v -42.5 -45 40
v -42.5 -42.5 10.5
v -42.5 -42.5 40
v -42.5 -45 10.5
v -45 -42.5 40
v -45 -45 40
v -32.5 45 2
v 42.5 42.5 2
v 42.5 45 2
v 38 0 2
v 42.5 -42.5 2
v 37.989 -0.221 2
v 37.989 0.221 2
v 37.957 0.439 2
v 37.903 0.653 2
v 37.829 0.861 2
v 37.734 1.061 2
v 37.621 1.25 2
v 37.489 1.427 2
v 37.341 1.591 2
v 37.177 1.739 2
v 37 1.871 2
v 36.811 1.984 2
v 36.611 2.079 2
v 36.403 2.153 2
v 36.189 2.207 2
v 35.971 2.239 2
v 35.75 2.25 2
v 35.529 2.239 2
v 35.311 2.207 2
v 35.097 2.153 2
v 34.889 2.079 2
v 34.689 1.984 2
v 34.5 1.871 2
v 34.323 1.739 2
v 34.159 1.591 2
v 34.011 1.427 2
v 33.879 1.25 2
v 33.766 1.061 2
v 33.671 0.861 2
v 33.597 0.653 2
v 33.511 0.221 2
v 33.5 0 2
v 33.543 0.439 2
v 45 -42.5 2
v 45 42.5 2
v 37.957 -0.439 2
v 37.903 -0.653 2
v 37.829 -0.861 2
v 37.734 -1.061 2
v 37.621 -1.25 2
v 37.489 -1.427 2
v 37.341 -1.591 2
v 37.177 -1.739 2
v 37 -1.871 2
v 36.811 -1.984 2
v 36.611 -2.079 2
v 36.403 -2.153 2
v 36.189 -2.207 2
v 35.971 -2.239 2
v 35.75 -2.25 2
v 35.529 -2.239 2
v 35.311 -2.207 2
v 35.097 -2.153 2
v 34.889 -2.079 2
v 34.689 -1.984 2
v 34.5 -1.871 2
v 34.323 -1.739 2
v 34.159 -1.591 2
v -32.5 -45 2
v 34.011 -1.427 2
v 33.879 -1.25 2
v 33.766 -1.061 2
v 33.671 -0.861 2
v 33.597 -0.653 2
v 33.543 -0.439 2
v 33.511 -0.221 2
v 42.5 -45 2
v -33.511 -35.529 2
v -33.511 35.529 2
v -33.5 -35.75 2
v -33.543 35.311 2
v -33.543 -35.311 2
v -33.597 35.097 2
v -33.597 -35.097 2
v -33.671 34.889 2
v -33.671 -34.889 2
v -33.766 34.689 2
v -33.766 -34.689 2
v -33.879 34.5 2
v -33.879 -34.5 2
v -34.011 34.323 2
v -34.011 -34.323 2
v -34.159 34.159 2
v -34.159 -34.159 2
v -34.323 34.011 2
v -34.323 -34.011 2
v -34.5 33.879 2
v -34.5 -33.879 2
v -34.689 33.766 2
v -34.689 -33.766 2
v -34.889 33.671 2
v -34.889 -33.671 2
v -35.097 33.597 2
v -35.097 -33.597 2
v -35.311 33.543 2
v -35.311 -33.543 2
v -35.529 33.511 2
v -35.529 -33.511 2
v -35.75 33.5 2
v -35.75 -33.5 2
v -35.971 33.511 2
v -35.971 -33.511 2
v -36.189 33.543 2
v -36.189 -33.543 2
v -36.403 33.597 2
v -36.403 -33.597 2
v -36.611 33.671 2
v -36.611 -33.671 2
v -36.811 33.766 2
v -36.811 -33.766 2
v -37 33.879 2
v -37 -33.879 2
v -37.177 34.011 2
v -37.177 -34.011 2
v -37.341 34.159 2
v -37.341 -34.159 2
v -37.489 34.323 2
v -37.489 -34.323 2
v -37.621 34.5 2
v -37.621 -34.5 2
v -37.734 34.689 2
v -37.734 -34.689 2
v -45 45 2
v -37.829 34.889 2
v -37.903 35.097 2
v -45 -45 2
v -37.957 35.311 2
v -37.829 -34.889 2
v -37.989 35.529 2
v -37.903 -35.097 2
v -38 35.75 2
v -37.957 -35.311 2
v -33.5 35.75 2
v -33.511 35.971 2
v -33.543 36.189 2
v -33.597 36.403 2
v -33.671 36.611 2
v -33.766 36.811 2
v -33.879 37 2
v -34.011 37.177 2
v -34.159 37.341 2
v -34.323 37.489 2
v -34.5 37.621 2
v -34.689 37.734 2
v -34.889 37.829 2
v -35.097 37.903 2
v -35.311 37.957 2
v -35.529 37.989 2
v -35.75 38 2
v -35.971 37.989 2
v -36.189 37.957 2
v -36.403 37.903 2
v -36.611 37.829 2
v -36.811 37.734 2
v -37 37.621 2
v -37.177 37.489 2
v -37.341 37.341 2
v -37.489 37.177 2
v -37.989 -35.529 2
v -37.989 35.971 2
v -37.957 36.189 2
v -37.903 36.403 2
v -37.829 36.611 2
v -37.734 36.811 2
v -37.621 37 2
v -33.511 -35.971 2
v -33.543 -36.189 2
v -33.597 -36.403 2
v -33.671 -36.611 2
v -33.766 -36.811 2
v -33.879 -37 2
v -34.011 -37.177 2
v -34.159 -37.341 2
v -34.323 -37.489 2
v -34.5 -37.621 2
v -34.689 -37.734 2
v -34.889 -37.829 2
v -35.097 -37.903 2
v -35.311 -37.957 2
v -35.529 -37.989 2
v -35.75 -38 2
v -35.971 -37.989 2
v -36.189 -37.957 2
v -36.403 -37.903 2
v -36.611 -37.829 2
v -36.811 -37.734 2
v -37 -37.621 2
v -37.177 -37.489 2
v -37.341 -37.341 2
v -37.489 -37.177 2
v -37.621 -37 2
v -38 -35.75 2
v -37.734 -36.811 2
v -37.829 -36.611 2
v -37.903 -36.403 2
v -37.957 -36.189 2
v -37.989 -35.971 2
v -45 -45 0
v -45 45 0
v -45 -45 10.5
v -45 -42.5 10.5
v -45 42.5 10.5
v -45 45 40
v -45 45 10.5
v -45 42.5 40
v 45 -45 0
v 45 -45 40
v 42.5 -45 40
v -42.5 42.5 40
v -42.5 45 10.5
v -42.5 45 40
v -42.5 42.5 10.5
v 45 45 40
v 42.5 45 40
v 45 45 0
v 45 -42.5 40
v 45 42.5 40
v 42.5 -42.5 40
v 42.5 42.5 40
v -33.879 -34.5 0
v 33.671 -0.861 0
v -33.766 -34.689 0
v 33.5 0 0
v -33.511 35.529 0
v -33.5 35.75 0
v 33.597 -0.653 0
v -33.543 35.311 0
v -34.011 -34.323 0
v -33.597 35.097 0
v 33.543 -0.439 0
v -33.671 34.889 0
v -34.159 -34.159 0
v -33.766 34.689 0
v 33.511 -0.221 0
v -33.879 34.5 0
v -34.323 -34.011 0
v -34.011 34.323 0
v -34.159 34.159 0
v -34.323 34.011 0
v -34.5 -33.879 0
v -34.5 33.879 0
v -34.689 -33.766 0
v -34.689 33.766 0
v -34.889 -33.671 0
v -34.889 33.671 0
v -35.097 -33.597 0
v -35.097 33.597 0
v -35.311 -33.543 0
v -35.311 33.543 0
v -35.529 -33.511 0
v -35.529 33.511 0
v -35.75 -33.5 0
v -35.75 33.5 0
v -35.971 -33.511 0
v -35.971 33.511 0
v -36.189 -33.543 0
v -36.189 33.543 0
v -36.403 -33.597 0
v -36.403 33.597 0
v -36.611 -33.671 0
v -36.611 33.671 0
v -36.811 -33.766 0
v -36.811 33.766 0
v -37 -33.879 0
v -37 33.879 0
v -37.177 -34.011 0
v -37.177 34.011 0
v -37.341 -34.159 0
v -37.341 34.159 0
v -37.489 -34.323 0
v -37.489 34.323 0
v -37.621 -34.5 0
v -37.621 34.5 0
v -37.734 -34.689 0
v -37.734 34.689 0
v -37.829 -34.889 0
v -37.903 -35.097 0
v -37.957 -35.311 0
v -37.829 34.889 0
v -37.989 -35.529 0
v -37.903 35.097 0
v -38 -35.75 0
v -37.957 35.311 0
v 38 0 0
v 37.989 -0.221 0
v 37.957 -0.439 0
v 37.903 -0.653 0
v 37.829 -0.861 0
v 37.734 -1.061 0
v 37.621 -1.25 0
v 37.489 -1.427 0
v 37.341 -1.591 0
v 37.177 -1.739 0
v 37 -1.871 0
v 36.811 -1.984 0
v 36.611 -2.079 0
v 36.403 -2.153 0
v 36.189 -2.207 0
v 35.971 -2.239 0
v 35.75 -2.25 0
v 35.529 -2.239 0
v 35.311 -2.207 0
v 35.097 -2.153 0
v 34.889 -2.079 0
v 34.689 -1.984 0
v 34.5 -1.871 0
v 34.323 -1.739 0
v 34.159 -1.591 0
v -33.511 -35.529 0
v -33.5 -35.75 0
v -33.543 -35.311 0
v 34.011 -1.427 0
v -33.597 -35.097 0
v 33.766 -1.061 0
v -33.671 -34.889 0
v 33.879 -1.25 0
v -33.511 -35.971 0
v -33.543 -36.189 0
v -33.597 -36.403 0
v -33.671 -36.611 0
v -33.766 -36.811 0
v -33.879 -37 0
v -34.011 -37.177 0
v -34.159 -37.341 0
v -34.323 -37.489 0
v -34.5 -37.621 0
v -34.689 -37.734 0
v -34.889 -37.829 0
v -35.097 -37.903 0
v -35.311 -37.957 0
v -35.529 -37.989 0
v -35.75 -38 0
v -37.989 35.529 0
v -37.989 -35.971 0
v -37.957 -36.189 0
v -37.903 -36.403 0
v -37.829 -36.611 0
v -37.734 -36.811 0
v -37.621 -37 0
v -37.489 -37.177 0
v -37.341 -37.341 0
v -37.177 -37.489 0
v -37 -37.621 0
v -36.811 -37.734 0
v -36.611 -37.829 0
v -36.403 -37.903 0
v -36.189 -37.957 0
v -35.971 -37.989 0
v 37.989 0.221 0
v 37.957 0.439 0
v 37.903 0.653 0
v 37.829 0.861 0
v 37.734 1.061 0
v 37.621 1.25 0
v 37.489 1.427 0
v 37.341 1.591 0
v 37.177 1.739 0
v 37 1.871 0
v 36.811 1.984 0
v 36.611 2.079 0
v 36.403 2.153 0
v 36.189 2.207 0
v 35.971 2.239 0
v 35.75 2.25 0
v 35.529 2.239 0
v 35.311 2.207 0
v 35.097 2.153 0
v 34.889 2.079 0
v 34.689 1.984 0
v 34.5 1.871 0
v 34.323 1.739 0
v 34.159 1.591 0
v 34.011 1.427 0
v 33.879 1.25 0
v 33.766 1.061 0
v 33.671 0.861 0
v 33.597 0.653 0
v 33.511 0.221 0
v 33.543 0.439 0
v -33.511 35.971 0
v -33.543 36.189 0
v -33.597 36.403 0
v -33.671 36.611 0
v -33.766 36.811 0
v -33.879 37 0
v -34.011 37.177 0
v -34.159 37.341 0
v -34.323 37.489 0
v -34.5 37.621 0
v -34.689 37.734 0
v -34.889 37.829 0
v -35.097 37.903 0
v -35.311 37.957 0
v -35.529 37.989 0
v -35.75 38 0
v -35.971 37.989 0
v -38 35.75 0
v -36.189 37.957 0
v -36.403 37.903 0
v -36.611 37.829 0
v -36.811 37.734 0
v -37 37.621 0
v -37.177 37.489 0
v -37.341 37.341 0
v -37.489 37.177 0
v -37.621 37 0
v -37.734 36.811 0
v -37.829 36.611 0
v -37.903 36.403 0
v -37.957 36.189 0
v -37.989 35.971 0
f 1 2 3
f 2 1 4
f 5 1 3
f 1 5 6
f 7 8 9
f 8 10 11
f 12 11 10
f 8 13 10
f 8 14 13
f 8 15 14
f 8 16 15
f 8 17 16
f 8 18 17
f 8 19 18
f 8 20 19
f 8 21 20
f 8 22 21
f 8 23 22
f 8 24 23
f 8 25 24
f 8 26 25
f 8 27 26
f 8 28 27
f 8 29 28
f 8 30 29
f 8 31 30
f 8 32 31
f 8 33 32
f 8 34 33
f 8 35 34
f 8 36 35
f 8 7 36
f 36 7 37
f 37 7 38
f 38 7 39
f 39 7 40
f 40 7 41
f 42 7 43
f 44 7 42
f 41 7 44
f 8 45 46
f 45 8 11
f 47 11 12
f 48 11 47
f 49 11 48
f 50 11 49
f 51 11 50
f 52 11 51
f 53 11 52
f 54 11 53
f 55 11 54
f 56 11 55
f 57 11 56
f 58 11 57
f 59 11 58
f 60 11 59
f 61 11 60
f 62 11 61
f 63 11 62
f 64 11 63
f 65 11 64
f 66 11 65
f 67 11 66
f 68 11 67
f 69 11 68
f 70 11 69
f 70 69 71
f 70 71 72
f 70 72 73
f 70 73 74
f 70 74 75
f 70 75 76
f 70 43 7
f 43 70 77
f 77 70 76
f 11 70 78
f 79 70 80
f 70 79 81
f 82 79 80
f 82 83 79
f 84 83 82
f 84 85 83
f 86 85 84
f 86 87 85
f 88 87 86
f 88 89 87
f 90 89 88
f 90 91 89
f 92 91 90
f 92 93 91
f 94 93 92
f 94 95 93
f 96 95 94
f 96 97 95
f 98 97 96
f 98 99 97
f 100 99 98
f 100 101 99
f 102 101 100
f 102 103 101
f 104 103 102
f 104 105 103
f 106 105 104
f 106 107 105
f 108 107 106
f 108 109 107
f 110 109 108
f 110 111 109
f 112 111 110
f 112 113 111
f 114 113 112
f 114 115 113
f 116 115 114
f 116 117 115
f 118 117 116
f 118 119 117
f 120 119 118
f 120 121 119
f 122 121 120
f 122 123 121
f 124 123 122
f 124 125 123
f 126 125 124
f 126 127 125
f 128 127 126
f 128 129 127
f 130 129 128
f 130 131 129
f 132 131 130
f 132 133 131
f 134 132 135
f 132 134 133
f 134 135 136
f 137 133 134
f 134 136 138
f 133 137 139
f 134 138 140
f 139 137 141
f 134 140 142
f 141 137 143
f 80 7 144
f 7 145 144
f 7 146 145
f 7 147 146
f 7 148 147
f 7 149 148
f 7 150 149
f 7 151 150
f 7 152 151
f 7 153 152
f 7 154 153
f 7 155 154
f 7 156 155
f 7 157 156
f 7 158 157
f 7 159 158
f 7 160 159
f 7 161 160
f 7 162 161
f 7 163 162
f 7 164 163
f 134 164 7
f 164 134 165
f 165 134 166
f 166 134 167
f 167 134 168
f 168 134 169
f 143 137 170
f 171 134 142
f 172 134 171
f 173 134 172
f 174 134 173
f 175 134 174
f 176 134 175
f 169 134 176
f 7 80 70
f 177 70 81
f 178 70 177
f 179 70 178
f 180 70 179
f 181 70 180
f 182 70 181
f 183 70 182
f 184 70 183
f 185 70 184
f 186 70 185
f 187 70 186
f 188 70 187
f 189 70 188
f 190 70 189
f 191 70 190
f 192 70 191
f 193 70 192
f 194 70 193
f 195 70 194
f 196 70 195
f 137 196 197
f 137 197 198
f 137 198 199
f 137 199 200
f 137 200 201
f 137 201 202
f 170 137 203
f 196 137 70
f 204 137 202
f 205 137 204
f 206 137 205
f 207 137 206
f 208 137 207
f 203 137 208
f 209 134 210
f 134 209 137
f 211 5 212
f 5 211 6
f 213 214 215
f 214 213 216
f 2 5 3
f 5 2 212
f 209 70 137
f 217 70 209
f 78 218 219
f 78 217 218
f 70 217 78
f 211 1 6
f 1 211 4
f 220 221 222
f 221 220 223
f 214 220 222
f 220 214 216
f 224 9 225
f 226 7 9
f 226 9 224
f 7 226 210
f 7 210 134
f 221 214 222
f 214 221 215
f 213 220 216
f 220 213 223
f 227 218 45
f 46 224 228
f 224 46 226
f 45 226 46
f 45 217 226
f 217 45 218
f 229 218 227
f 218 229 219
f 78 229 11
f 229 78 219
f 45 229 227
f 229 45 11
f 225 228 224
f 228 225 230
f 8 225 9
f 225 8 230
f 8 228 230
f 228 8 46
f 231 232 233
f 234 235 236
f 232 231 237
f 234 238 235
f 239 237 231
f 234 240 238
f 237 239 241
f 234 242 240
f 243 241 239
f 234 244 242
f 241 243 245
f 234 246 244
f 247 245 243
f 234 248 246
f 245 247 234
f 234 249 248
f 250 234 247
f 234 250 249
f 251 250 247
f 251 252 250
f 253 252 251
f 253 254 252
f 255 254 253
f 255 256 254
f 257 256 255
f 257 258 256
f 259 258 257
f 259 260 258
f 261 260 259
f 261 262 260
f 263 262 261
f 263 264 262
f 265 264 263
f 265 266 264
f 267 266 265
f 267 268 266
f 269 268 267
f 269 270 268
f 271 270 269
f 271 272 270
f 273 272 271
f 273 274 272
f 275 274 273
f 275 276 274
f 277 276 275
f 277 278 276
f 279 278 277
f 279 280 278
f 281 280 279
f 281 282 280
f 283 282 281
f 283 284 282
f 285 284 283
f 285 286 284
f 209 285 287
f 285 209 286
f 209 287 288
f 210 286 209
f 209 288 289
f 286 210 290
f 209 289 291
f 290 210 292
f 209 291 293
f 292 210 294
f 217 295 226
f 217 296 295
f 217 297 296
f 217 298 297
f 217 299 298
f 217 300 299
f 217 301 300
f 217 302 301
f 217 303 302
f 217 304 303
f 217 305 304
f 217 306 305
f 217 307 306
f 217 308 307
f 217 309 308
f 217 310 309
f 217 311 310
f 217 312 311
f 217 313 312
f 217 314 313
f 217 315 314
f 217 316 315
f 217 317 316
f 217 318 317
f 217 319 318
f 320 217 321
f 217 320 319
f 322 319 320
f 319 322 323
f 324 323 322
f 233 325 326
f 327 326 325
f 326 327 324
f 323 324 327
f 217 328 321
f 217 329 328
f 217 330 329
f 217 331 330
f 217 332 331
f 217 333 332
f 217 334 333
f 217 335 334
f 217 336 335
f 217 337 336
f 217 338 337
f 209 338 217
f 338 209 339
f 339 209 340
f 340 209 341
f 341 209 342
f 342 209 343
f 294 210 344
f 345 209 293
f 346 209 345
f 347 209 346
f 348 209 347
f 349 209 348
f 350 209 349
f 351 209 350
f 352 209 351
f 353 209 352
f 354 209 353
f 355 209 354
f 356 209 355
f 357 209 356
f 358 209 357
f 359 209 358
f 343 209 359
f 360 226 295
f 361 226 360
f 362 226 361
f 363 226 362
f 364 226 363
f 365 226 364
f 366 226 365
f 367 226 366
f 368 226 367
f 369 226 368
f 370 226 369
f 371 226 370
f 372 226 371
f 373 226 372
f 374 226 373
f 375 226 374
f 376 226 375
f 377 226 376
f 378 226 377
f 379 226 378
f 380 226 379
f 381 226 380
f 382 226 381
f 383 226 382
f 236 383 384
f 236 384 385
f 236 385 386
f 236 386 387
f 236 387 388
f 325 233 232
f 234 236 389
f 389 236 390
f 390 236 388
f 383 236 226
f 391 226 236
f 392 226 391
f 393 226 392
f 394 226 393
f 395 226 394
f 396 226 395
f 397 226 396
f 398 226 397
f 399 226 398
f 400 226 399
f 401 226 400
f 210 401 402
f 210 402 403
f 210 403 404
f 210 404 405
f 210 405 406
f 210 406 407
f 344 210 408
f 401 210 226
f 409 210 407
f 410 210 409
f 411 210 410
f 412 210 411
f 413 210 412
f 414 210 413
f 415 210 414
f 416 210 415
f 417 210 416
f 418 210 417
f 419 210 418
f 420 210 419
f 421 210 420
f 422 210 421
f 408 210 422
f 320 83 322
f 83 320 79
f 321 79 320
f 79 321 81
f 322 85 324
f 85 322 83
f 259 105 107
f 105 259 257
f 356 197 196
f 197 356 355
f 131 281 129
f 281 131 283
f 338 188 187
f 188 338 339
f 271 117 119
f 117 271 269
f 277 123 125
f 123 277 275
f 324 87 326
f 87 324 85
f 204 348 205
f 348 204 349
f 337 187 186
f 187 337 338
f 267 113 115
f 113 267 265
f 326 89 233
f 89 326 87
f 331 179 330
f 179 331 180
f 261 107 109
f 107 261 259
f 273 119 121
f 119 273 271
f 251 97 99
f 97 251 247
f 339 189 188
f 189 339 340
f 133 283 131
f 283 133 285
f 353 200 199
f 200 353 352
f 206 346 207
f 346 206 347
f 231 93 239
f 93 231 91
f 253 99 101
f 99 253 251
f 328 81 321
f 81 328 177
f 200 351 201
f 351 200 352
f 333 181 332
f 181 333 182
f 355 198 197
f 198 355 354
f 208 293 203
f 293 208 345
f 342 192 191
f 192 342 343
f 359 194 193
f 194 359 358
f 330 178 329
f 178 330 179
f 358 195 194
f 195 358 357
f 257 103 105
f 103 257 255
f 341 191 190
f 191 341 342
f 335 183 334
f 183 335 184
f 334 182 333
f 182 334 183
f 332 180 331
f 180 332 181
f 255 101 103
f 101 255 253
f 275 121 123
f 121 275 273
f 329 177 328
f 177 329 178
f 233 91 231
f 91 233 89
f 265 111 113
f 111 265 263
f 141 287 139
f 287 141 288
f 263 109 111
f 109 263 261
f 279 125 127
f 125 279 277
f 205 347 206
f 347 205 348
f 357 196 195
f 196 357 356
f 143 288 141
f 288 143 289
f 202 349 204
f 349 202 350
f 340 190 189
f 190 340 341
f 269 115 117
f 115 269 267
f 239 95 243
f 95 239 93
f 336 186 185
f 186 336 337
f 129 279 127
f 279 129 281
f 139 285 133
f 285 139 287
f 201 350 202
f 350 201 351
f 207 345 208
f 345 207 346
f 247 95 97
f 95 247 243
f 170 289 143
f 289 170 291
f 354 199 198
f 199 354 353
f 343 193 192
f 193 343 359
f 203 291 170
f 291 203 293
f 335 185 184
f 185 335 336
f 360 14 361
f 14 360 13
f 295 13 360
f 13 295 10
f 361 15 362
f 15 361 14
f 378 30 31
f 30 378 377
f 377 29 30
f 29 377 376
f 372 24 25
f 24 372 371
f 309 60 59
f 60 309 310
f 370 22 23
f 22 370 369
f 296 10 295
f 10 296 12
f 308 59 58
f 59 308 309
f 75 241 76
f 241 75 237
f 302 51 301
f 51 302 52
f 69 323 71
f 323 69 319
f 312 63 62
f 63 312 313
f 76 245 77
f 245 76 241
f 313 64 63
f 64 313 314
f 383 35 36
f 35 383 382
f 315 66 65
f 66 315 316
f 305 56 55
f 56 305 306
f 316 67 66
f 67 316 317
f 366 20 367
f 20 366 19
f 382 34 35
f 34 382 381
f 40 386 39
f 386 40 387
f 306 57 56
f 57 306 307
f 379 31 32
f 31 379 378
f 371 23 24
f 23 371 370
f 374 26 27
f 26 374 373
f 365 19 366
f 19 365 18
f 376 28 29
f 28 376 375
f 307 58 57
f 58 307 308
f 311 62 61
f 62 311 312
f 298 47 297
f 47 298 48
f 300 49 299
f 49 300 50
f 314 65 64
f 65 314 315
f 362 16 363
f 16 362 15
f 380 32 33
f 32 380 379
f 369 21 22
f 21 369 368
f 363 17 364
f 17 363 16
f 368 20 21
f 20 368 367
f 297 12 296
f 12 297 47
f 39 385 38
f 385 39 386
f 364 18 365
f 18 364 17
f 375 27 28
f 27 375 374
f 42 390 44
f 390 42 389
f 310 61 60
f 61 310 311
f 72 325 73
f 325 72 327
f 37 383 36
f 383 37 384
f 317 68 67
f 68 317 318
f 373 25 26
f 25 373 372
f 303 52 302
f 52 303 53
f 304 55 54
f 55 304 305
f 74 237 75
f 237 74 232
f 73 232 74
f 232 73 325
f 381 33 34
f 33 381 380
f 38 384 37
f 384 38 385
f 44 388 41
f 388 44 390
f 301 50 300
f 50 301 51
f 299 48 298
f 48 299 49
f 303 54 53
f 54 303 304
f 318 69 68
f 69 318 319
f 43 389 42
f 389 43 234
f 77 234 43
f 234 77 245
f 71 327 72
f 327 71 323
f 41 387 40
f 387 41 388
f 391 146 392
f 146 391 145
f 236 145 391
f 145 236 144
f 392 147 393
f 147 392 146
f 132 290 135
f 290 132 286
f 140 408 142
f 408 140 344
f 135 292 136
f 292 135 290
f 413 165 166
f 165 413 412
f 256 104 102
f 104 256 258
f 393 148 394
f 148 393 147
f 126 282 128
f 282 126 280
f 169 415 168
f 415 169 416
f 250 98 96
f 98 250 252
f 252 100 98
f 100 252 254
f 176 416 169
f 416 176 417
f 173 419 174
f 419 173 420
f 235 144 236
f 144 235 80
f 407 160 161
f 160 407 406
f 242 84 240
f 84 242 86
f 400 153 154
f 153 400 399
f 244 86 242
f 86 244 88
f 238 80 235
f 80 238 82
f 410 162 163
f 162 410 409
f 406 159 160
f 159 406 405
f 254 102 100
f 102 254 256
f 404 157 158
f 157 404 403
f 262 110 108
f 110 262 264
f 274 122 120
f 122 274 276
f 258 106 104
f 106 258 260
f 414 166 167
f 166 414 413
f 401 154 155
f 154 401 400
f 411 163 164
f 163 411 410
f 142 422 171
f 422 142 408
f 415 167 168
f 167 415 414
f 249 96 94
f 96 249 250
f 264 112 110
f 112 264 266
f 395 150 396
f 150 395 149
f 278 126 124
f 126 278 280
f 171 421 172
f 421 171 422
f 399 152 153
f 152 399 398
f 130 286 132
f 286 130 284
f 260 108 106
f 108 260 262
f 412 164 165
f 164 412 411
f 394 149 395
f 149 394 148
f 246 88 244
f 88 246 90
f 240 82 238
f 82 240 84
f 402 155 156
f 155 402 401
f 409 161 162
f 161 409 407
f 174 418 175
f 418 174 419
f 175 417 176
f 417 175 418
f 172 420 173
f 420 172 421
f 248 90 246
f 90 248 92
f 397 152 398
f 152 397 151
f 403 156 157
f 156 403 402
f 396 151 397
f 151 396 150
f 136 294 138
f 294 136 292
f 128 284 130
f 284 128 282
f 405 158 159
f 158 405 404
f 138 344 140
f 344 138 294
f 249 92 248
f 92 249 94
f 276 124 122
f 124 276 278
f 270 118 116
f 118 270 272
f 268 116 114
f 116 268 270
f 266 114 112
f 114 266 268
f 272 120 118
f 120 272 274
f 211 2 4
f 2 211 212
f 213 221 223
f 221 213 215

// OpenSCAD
// DIY magnetic stirrer housing for 80 mm PC case fan
// Print orientation: top plate on bed (z = 0), walls build upward (+Z)

// ---------------- Parameters ----------------
outer_size   = 90;    // outer size of top plate and box (X x Y)
plate_t      = 2;     // top plate thickness (z = 0 to 2)
wall_t       = 2.5;   // wall thickness (z = 2 to 40)
box_h        = 40;    // total height of box from bed (top edge at z = 40)
hole_d       = 4.5;   // screw hole diameter (M4)
hole_pitch   = 71.5;  // square pattern pitch for screw holes
hole_count   = 4;     // number of screw holes
notch_w      = 12;    // power cable notch width
notch_depth  = 8;     // notch depth from open edge (z = 32 to 40)
eps          = 0.5;   // cutter overshoot past faces

$fn = 64;

// ---------------- Model ----------------
difference() {
    union() {
        // Top plate (lies on bed)
        translate([-outer_size/2, -outer_size/2, 0])
            cube([outer_size, outer_size, plate_t]);

        // Four walls rising from plate to open top (z = 40)
        for (sx = [-1, 1], sy = [-1, 1]) {
            translate([sx > 0 ? outer_size/2 - wall_t : -outer_size/2,
                       sy > 0 ? outer_size/2 - wall_t : -outer_size/2,
                       plate_t])
                cube([wall_t, wall_t, box_h - plate_t]);
        }
    }

    // Screw holes through top plate on square pattern
    for (i = [0 : hole_count - 1]) {
        x = (i % 2 - 0.5) * hole_pitch;
        y = (i / 2 - 0.5) * hole_pitch;
        translate([x, y, -eps])
            cylinder(d = hole_d, h = plate_t + 2*eps);
    }

    // Power cable notch in one wall (z = 32 to 40, open edge at z = 40)
    translate([-outer_size/2 - eps, -outer_size/2 - eps, plate_t])
        cube([notch_w + 2*eps, outer_size + 2*eps, notch_depth + eps]);
}
